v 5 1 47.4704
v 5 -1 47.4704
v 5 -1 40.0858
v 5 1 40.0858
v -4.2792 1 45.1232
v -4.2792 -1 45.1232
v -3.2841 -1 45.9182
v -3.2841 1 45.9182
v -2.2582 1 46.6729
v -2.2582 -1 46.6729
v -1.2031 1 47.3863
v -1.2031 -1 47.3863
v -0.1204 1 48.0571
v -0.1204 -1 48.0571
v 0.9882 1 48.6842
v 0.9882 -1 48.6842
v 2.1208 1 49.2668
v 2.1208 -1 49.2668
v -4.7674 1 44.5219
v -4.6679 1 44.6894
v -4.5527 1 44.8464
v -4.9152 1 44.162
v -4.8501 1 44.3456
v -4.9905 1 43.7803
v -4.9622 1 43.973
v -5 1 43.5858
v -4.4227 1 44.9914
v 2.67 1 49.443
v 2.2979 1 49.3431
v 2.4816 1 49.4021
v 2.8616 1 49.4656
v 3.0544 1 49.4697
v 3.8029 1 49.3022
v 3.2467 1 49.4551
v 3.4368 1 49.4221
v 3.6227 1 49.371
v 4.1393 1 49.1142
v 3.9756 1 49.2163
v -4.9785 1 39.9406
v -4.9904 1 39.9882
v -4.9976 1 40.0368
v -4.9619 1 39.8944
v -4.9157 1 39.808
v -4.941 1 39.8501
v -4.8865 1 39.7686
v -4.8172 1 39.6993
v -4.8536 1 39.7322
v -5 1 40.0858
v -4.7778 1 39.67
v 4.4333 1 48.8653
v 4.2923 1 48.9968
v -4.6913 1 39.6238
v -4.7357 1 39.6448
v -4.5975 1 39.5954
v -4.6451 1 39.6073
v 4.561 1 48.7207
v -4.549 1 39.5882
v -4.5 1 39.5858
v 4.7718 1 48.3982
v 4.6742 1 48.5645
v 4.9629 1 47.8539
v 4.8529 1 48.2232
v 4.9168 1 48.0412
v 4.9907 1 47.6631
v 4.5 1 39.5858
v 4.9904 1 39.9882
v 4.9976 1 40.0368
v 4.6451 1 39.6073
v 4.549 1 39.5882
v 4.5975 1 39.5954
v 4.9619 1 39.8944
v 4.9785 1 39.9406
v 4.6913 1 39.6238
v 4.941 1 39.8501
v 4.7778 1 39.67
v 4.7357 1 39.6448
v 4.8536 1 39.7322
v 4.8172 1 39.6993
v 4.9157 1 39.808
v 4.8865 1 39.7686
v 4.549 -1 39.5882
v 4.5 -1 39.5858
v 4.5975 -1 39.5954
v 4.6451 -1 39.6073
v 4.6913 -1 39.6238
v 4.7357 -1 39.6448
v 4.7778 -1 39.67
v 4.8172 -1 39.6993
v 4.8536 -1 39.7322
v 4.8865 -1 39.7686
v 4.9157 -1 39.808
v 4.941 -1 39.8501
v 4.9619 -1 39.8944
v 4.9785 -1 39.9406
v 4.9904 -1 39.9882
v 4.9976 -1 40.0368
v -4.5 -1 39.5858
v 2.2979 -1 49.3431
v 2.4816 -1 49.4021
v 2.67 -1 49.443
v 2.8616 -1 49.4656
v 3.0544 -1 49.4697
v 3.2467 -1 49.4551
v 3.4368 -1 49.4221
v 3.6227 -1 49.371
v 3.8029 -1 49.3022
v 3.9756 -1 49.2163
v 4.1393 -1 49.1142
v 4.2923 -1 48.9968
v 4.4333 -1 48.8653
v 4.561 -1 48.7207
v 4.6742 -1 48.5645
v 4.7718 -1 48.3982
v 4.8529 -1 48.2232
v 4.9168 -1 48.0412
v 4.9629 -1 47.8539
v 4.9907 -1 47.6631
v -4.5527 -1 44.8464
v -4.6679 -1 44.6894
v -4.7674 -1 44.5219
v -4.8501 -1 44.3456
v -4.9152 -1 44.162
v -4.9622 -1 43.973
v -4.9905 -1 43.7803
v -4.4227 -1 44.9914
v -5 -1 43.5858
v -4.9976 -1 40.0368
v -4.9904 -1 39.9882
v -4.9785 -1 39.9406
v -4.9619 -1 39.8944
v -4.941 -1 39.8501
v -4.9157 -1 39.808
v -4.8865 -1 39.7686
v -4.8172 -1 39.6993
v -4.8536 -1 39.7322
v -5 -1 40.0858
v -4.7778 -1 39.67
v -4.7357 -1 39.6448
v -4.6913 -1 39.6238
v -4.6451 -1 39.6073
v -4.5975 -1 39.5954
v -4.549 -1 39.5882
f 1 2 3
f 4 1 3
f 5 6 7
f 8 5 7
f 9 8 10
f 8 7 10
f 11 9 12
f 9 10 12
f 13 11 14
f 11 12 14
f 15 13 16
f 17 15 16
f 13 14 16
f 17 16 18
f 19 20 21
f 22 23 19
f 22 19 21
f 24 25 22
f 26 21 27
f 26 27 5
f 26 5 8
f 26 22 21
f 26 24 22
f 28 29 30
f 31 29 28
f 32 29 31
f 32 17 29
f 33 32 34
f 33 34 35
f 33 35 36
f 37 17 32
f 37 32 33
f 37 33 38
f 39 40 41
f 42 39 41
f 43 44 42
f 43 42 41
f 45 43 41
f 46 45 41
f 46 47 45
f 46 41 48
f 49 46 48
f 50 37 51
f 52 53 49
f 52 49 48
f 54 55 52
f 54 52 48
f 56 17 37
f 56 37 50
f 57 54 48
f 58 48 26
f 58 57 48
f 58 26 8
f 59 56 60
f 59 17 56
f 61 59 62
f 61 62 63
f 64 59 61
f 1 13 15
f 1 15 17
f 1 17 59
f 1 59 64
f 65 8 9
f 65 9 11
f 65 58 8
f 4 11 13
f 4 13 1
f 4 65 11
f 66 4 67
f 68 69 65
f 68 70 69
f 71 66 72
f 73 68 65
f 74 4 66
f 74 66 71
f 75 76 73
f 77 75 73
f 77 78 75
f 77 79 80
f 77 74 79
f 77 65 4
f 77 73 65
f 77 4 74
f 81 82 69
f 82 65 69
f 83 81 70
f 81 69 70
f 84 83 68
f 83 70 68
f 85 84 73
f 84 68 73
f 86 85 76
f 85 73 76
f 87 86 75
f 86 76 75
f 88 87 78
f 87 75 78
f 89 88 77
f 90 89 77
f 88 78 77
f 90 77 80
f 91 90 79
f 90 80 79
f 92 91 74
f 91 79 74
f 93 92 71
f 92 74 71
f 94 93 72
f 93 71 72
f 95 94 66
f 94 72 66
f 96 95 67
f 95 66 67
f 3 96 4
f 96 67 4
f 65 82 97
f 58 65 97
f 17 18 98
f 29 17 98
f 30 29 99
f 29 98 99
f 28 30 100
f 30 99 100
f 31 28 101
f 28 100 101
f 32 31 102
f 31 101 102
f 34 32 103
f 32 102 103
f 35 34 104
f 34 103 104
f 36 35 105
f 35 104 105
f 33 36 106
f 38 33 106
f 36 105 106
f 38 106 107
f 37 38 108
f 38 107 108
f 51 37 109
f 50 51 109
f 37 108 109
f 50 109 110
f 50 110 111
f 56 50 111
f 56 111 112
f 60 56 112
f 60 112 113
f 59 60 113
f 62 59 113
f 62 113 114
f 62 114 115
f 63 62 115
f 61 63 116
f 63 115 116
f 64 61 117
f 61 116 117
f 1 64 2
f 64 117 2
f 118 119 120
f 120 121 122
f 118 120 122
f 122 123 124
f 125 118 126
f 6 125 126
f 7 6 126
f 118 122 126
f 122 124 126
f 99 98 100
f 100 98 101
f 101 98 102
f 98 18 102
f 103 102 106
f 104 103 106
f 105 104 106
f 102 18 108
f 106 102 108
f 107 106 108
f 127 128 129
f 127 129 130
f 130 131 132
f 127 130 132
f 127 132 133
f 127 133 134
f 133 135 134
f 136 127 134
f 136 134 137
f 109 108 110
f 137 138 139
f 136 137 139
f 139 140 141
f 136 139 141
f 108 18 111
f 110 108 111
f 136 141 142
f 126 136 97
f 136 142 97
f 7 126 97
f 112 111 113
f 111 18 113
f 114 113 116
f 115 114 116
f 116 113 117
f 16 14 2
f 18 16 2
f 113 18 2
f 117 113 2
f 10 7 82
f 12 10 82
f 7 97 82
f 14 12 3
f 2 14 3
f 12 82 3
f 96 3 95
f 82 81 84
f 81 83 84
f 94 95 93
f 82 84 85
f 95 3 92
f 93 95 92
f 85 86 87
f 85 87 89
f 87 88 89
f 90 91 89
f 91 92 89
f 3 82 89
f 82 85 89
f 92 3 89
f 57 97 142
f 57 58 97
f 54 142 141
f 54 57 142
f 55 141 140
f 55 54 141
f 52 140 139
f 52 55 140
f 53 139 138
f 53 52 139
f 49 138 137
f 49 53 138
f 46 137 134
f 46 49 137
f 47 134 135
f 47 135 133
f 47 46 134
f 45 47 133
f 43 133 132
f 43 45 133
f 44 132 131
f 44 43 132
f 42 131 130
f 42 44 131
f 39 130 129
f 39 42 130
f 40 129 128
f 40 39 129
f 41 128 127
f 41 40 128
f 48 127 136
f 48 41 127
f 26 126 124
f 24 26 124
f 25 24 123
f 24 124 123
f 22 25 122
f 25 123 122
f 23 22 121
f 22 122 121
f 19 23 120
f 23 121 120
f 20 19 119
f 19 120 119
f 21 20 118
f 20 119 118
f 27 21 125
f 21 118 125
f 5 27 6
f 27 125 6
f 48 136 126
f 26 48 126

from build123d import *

# Parameters (mm, degrees)
STOCK_SHORT_HANDLE_L_1_START = -1
STOCK_SHORT_HANDLE_L_1_DEPTH = 2
FILLET1_R                    = 0.5


# Read off the part's stored shape, not the designer's step: Stock-short-handle_L-1
with BuildPart() as part:
    # Stock-short-handle_L-1 outline → Stock-short-handle_L-1 (new body)
    with BuildSketch(Plane(origin=(0, 0, 0), x_dir=(1, 0, 0), z_dir=(0, 1, 0)).offset(STOCK_SHORT_HANDLE_L_1_START)):
        with BuildLine():
            Line((5, -39.585762407), (-5, -39.585762407))
            Line((-5, -39.585762407), (-5, -43.585762407))
            ThreePointArc((-5, -43.585762407), (-4.810860404, -44.434752748), (-4.279215401, -45.123165398))
            ThreePointArc((-4.279215401, -45.123165398), (-1.203063357, -47.386267754), (2.120784599, -49.266793861))
            ThreePointArc((2.120784599, -49.266793861), (4.058671148, -49.167239185), (5, -47.470414091))
            Line((5, -47.470414091), (5, -39.585762407))
        make_face()
    extrude(amount=STOCK_SHORT_HANDLE_L_1_DEPTH)

    # Fillet1
    fillet1_edges = [part.edges().sort_by_distance(p)[0] for p in [
        (5, 0, 39.585762407),
        (-5, 0, 39.585762407),
    ]]
    fillet(fillet1_edges, radius=FILLET1_R)


solid = part.part
